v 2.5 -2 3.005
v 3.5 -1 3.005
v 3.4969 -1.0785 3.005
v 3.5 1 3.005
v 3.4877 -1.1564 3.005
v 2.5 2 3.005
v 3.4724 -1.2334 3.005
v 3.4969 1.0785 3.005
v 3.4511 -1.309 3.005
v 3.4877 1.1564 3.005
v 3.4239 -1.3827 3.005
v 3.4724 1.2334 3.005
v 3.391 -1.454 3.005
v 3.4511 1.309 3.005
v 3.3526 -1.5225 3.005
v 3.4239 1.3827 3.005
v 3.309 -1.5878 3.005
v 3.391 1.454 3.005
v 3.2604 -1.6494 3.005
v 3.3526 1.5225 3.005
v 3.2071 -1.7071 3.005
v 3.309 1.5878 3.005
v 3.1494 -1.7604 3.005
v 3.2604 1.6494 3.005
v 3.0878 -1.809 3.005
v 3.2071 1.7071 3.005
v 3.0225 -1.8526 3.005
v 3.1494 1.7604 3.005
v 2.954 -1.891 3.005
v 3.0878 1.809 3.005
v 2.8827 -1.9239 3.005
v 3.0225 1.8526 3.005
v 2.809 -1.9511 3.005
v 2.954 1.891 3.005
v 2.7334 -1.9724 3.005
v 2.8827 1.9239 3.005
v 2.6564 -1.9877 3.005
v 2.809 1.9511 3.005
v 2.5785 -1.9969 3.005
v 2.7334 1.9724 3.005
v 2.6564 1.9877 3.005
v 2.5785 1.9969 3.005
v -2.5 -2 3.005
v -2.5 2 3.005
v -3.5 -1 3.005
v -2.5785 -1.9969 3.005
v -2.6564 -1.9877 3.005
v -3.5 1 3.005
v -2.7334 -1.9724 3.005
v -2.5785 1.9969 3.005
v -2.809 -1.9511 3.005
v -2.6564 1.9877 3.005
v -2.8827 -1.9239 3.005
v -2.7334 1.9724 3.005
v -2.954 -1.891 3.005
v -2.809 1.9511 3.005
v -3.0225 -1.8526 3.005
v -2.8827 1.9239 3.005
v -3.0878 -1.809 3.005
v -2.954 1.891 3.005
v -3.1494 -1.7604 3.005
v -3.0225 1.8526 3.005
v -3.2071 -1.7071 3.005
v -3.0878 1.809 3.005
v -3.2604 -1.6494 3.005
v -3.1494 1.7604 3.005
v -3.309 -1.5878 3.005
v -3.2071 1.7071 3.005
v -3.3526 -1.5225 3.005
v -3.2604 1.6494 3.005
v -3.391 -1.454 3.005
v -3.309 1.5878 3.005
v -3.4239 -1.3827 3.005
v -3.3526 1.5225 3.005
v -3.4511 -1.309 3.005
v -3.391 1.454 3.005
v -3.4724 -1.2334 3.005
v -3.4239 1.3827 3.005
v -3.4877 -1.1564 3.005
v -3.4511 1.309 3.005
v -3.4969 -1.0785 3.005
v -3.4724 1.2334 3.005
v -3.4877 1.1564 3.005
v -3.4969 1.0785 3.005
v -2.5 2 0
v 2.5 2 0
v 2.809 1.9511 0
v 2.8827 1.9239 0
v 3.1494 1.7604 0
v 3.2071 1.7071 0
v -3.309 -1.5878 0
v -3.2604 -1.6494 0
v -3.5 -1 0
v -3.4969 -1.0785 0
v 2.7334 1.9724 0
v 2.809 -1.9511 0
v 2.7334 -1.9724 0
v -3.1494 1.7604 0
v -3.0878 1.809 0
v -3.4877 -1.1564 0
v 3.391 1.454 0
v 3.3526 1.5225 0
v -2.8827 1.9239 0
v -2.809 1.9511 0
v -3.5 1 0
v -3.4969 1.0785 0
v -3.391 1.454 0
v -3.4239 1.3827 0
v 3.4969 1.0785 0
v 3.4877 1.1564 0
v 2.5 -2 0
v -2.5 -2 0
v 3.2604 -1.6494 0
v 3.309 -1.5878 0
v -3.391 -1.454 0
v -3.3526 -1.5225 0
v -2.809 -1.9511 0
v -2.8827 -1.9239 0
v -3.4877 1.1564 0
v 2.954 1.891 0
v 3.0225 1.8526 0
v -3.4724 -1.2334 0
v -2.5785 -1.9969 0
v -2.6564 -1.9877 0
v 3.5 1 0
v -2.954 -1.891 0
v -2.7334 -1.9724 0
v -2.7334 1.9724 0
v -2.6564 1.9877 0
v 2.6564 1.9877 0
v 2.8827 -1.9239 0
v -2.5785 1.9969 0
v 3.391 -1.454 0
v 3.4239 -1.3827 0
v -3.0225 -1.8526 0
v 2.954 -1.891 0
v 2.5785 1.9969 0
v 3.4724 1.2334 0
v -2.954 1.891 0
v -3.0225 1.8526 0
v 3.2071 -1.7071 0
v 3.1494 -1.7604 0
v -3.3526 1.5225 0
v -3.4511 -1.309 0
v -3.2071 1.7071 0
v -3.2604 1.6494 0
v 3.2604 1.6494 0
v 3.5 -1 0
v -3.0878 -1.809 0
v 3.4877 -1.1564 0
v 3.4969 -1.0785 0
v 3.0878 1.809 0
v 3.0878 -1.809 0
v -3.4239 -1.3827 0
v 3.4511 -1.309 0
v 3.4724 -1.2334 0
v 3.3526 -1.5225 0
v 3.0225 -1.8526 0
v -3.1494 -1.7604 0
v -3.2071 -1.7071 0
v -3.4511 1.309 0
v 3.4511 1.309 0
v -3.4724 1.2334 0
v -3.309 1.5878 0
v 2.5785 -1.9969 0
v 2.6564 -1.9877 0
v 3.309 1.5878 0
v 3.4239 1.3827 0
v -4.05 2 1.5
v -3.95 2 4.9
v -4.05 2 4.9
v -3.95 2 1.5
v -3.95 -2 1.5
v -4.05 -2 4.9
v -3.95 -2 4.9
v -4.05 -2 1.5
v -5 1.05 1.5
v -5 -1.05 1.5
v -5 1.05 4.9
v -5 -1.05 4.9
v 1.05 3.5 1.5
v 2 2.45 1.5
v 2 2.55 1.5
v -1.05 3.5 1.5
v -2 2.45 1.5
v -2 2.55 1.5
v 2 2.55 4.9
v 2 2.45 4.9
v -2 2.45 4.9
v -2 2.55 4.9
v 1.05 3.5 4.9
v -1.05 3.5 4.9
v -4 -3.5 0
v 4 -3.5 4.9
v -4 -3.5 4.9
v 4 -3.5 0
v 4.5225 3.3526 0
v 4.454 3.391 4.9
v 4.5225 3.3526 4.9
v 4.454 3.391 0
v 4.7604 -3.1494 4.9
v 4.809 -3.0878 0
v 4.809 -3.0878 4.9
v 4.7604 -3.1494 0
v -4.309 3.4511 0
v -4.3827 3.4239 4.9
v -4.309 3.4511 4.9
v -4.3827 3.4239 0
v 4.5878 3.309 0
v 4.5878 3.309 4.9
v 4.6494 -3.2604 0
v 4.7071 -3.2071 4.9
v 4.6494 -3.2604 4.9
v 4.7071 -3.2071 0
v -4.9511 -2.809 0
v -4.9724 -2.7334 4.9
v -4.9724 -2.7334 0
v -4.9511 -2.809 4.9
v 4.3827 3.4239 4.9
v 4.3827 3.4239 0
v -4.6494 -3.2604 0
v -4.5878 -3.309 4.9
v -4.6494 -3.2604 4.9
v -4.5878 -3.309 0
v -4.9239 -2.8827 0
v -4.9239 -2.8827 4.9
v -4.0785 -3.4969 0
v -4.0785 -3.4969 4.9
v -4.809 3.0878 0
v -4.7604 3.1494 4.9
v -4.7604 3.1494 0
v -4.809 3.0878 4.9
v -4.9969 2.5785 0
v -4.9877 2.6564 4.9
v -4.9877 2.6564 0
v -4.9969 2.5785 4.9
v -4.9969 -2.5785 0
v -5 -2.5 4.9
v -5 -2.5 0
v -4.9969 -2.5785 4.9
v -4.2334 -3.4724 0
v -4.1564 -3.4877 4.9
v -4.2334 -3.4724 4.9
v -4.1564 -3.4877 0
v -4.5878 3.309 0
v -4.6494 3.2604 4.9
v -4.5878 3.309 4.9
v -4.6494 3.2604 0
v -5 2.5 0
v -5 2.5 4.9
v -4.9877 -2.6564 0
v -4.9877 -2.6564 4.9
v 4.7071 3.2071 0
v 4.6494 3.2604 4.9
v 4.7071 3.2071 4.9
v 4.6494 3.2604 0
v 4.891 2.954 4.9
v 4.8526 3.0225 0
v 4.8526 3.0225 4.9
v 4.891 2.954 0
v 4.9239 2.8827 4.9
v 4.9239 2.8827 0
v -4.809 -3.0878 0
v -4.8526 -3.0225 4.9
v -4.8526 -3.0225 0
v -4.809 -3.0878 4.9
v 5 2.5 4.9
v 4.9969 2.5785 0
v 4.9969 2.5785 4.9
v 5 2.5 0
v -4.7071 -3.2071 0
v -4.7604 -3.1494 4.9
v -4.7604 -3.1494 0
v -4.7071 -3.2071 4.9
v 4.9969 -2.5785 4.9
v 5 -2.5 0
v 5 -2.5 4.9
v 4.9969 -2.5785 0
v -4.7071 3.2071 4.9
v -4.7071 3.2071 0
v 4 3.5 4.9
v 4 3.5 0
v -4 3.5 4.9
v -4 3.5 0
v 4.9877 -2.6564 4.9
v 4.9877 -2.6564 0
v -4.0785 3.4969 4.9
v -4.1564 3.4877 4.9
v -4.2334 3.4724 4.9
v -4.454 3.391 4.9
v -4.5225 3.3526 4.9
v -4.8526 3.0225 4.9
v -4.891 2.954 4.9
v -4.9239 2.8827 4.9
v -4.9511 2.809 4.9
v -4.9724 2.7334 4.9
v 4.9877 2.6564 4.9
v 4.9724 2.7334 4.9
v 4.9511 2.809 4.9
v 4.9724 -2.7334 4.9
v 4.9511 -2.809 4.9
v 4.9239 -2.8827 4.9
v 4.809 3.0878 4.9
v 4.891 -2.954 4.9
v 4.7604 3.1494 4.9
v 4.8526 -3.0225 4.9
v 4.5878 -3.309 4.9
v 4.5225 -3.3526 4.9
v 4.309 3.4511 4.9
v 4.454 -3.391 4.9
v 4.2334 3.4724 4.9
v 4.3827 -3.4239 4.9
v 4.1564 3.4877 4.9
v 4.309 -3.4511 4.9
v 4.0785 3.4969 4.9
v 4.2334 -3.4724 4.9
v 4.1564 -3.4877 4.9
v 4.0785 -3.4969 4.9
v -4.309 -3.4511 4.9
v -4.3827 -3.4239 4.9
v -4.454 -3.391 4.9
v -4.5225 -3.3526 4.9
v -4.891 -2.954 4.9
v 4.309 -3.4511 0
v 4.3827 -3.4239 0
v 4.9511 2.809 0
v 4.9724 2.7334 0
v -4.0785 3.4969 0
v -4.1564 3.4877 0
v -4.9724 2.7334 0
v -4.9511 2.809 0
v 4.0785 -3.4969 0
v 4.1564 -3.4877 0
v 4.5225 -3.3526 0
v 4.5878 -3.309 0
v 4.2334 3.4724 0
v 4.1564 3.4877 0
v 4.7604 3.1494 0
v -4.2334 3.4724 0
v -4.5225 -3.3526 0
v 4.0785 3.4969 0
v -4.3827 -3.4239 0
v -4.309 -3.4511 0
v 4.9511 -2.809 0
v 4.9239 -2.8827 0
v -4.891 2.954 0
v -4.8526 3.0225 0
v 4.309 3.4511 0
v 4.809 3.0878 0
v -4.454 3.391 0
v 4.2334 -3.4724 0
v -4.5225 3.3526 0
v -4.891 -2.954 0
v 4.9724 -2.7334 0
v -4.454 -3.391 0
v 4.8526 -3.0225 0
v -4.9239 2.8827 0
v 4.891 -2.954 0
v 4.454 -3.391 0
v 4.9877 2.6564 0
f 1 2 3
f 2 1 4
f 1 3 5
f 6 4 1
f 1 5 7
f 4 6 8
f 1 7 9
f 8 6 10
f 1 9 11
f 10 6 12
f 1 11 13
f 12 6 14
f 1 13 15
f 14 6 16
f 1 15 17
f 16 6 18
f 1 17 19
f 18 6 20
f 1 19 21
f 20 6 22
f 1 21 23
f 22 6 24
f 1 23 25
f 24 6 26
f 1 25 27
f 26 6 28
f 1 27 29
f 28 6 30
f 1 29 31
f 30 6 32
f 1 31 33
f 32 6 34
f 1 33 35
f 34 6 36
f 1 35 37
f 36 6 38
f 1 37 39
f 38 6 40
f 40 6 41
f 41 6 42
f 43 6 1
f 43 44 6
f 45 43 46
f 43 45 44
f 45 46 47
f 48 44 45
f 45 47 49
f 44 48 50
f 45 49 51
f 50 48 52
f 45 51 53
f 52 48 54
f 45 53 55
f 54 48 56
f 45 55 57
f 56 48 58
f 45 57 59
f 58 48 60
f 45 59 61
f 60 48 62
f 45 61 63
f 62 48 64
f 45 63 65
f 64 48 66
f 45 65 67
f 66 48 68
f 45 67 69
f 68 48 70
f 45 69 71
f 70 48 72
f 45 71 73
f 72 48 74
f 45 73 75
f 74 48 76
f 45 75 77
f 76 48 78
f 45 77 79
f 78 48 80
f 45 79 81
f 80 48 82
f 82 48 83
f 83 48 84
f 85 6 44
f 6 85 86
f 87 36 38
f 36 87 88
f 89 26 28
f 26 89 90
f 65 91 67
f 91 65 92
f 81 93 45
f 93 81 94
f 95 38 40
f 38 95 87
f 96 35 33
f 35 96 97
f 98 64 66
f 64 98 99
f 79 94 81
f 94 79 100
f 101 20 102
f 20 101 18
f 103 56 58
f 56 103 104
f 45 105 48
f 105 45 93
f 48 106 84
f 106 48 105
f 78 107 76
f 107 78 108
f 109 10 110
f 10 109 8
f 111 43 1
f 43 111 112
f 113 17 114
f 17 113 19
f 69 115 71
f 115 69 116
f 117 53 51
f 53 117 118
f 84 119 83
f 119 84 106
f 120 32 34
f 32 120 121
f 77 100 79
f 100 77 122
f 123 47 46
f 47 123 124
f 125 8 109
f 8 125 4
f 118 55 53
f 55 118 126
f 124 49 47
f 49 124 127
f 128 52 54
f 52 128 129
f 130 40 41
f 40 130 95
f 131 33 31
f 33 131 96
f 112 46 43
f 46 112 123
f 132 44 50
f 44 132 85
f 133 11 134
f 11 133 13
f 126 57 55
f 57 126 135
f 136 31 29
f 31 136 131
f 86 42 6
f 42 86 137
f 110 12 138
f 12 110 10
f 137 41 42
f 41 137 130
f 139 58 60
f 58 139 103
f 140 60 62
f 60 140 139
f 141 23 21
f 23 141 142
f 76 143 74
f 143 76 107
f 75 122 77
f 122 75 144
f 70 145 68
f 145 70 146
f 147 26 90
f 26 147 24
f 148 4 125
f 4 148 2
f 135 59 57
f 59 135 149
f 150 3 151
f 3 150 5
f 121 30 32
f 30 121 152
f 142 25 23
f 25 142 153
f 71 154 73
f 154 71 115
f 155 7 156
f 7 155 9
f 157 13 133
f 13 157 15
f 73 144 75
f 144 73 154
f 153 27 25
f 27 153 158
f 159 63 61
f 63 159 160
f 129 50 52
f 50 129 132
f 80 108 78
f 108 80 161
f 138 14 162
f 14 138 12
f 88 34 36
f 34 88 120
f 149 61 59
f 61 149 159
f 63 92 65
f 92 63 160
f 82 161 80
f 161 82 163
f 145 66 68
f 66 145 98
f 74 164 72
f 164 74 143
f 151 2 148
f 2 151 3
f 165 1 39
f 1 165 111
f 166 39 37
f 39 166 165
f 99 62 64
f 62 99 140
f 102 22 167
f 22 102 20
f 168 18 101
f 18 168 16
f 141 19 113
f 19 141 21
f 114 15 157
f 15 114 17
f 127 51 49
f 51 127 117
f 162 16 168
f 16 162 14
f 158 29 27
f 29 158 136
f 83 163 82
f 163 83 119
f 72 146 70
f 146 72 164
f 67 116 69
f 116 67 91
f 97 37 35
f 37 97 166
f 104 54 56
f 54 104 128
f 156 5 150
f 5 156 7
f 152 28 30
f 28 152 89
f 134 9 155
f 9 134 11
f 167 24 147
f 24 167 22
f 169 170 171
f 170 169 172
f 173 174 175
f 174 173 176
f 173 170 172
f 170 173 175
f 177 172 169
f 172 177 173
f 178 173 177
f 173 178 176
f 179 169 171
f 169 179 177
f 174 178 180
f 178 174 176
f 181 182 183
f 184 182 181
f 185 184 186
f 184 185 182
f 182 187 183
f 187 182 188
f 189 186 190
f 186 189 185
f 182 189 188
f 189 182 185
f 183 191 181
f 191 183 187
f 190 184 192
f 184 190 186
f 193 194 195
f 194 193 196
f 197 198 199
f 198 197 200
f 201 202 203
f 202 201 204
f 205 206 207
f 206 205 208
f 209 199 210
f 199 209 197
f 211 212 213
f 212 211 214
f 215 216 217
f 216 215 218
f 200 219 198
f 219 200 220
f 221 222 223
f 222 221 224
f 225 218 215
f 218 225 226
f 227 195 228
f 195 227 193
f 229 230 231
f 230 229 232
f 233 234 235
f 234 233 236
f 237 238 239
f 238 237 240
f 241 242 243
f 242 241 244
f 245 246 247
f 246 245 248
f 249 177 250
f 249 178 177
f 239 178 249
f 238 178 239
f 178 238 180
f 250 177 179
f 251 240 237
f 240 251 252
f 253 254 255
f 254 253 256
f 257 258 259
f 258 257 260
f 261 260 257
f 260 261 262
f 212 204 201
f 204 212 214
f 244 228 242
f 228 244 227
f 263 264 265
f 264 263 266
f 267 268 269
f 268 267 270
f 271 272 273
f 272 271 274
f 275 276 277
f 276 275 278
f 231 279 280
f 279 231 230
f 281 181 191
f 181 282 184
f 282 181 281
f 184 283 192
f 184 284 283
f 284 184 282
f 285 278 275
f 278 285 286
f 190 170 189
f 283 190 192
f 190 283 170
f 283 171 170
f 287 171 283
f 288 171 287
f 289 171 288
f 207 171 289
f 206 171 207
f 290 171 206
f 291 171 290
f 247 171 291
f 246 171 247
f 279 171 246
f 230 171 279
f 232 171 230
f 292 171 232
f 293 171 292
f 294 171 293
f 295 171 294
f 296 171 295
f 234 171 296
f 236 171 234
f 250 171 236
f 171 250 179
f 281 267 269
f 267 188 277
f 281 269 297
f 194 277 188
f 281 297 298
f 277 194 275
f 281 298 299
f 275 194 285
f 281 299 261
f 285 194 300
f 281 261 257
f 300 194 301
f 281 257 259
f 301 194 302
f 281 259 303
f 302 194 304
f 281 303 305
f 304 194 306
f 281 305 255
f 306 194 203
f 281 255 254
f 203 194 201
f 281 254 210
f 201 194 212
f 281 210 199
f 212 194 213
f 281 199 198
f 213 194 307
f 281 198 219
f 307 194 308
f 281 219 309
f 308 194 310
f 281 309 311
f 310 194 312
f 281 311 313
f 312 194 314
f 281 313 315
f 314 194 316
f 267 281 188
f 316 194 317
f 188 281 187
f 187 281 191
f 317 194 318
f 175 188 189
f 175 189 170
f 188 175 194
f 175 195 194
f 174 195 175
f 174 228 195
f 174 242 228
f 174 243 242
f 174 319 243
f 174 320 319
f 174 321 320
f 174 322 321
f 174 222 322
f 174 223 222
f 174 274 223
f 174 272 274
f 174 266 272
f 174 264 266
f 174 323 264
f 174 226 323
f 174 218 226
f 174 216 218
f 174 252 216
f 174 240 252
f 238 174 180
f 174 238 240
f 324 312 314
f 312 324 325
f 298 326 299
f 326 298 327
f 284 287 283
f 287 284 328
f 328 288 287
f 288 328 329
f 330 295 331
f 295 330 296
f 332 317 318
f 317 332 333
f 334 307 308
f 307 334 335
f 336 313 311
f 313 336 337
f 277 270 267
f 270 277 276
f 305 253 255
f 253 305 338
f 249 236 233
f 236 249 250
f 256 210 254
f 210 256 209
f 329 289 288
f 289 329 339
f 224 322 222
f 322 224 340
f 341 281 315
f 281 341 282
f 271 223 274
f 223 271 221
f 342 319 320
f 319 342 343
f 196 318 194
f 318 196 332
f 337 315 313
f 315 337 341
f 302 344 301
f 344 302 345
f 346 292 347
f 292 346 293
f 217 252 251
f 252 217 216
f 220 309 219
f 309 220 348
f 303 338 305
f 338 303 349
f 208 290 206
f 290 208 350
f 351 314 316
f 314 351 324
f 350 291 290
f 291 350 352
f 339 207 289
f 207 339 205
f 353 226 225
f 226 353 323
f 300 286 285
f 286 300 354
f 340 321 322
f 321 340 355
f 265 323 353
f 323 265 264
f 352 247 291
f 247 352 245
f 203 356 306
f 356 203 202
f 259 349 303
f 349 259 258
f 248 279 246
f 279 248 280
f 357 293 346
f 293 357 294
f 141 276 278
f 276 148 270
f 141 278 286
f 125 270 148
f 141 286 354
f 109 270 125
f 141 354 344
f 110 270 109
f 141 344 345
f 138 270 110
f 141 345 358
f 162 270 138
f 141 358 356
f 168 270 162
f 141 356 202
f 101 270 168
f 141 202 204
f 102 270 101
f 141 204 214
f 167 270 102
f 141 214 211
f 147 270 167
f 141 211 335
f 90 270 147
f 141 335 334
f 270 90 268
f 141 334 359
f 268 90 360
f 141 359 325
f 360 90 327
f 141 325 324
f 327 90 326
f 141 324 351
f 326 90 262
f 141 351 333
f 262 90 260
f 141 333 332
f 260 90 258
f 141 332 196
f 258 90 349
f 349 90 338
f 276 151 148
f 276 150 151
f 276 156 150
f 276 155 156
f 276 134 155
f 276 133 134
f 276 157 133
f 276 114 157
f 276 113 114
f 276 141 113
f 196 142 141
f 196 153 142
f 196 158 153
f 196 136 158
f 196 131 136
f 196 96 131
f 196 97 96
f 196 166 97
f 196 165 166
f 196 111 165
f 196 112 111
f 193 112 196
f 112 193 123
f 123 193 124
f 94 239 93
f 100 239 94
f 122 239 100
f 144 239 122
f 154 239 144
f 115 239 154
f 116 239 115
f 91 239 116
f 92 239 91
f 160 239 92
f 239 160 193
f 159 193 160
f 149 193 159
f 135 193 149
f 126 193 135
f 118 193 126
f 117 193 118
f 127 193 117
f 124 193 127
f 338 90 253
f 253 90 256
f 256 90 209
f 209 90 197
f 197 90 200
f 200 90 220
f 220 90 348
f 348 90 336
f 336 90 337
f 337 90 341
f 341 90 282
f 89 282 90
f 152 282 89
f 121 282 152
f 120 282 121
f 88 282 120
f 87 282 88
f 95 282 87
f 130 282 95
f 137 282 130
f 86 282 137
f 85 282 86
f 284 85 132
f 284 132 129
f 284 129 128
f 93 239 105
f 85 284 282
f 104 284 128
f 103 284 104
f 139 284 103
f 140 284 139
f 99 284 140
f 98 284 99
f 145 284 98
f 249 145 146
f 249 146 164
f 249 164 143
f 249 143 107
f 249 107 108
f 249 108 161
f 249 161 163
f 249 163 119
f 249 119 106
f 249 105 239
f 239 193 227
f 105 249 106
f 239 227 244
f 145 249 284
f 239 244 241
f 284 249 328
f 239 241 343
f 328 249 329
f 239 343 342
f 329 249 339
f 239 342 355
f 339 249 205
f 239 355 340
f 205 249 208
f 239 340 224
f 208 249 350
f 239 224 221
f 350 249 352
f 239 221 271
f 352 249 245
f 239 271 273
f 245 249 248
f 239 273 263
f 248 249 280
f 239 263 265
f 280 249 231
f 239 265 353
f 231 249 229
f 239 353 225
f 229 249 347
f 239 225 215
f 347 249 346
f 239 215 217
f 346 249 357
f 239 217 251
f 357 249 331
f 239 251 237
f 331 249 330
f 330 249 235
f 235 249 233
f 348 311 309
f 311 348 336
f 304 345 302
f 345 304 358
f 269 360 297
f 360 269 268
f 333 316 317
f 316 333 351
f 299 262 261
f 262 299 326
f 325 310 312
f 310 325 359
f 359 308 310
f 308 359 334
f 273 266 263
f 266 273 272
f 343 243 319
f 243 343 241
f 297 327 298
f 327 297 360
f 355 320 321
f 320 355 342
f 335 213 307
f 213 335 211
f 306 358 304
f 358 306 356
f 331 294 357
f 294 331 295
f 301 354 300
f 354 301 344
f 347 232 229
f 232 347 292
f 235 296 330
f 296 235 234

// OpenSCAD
/* 
 * Case for SAO DMM
 *
 * Design: hxr.social/@thomasflummer
 *
 * License: CC-BY-SA
 *
 */

module spacer(pcb_spacing)
{
    difference()
    {
        union()
        {
            hull()
            {
                for (x = [-1, 1])
                {
                    for (y = [-1, 1])
                    {
                        translate([x*(10/2 - 1), y*(7/2 - 1), pcb_spacing/2])
                            cylinder(r = 1, h = pcb_spacing, center = true, $fn = 80);
                    }
                }
            }
        }
        union()
        {
            hull()
            {
                for (x = [-1, 1])
                {
                    for (y = [-1, 1])
                    {
                        translate([x*(7/2 - 1), y*(4/2 - 1), 3/2])
                            cylinder(r = 1, h = 3.01, center = true, $fn = 80);
                    }
                }
            }
            
            // side, for boot/reset
            translate([-5, 0, 1.5])
            hull()
            {
                translate([1, 0, 10/2])
                    cube([0.1, 4, 10], center = true);

                translate([0, 0, 10/2])
                    cube([0.1, 2, 10], center = true);
            }

            // top for Fn
            translate([0, 7/2, 1.5])
            rotate(-90, [0, 0, 1])
            hull()
            {
                translate([1, 0, 10/2])
                    cube([0.1, 4, 10], center = true);

                translate([0, 0, 10/2])
                    cube([0.1, 2, 10], center = true);
            }

        }        
    }
}

spacer(4.9);
